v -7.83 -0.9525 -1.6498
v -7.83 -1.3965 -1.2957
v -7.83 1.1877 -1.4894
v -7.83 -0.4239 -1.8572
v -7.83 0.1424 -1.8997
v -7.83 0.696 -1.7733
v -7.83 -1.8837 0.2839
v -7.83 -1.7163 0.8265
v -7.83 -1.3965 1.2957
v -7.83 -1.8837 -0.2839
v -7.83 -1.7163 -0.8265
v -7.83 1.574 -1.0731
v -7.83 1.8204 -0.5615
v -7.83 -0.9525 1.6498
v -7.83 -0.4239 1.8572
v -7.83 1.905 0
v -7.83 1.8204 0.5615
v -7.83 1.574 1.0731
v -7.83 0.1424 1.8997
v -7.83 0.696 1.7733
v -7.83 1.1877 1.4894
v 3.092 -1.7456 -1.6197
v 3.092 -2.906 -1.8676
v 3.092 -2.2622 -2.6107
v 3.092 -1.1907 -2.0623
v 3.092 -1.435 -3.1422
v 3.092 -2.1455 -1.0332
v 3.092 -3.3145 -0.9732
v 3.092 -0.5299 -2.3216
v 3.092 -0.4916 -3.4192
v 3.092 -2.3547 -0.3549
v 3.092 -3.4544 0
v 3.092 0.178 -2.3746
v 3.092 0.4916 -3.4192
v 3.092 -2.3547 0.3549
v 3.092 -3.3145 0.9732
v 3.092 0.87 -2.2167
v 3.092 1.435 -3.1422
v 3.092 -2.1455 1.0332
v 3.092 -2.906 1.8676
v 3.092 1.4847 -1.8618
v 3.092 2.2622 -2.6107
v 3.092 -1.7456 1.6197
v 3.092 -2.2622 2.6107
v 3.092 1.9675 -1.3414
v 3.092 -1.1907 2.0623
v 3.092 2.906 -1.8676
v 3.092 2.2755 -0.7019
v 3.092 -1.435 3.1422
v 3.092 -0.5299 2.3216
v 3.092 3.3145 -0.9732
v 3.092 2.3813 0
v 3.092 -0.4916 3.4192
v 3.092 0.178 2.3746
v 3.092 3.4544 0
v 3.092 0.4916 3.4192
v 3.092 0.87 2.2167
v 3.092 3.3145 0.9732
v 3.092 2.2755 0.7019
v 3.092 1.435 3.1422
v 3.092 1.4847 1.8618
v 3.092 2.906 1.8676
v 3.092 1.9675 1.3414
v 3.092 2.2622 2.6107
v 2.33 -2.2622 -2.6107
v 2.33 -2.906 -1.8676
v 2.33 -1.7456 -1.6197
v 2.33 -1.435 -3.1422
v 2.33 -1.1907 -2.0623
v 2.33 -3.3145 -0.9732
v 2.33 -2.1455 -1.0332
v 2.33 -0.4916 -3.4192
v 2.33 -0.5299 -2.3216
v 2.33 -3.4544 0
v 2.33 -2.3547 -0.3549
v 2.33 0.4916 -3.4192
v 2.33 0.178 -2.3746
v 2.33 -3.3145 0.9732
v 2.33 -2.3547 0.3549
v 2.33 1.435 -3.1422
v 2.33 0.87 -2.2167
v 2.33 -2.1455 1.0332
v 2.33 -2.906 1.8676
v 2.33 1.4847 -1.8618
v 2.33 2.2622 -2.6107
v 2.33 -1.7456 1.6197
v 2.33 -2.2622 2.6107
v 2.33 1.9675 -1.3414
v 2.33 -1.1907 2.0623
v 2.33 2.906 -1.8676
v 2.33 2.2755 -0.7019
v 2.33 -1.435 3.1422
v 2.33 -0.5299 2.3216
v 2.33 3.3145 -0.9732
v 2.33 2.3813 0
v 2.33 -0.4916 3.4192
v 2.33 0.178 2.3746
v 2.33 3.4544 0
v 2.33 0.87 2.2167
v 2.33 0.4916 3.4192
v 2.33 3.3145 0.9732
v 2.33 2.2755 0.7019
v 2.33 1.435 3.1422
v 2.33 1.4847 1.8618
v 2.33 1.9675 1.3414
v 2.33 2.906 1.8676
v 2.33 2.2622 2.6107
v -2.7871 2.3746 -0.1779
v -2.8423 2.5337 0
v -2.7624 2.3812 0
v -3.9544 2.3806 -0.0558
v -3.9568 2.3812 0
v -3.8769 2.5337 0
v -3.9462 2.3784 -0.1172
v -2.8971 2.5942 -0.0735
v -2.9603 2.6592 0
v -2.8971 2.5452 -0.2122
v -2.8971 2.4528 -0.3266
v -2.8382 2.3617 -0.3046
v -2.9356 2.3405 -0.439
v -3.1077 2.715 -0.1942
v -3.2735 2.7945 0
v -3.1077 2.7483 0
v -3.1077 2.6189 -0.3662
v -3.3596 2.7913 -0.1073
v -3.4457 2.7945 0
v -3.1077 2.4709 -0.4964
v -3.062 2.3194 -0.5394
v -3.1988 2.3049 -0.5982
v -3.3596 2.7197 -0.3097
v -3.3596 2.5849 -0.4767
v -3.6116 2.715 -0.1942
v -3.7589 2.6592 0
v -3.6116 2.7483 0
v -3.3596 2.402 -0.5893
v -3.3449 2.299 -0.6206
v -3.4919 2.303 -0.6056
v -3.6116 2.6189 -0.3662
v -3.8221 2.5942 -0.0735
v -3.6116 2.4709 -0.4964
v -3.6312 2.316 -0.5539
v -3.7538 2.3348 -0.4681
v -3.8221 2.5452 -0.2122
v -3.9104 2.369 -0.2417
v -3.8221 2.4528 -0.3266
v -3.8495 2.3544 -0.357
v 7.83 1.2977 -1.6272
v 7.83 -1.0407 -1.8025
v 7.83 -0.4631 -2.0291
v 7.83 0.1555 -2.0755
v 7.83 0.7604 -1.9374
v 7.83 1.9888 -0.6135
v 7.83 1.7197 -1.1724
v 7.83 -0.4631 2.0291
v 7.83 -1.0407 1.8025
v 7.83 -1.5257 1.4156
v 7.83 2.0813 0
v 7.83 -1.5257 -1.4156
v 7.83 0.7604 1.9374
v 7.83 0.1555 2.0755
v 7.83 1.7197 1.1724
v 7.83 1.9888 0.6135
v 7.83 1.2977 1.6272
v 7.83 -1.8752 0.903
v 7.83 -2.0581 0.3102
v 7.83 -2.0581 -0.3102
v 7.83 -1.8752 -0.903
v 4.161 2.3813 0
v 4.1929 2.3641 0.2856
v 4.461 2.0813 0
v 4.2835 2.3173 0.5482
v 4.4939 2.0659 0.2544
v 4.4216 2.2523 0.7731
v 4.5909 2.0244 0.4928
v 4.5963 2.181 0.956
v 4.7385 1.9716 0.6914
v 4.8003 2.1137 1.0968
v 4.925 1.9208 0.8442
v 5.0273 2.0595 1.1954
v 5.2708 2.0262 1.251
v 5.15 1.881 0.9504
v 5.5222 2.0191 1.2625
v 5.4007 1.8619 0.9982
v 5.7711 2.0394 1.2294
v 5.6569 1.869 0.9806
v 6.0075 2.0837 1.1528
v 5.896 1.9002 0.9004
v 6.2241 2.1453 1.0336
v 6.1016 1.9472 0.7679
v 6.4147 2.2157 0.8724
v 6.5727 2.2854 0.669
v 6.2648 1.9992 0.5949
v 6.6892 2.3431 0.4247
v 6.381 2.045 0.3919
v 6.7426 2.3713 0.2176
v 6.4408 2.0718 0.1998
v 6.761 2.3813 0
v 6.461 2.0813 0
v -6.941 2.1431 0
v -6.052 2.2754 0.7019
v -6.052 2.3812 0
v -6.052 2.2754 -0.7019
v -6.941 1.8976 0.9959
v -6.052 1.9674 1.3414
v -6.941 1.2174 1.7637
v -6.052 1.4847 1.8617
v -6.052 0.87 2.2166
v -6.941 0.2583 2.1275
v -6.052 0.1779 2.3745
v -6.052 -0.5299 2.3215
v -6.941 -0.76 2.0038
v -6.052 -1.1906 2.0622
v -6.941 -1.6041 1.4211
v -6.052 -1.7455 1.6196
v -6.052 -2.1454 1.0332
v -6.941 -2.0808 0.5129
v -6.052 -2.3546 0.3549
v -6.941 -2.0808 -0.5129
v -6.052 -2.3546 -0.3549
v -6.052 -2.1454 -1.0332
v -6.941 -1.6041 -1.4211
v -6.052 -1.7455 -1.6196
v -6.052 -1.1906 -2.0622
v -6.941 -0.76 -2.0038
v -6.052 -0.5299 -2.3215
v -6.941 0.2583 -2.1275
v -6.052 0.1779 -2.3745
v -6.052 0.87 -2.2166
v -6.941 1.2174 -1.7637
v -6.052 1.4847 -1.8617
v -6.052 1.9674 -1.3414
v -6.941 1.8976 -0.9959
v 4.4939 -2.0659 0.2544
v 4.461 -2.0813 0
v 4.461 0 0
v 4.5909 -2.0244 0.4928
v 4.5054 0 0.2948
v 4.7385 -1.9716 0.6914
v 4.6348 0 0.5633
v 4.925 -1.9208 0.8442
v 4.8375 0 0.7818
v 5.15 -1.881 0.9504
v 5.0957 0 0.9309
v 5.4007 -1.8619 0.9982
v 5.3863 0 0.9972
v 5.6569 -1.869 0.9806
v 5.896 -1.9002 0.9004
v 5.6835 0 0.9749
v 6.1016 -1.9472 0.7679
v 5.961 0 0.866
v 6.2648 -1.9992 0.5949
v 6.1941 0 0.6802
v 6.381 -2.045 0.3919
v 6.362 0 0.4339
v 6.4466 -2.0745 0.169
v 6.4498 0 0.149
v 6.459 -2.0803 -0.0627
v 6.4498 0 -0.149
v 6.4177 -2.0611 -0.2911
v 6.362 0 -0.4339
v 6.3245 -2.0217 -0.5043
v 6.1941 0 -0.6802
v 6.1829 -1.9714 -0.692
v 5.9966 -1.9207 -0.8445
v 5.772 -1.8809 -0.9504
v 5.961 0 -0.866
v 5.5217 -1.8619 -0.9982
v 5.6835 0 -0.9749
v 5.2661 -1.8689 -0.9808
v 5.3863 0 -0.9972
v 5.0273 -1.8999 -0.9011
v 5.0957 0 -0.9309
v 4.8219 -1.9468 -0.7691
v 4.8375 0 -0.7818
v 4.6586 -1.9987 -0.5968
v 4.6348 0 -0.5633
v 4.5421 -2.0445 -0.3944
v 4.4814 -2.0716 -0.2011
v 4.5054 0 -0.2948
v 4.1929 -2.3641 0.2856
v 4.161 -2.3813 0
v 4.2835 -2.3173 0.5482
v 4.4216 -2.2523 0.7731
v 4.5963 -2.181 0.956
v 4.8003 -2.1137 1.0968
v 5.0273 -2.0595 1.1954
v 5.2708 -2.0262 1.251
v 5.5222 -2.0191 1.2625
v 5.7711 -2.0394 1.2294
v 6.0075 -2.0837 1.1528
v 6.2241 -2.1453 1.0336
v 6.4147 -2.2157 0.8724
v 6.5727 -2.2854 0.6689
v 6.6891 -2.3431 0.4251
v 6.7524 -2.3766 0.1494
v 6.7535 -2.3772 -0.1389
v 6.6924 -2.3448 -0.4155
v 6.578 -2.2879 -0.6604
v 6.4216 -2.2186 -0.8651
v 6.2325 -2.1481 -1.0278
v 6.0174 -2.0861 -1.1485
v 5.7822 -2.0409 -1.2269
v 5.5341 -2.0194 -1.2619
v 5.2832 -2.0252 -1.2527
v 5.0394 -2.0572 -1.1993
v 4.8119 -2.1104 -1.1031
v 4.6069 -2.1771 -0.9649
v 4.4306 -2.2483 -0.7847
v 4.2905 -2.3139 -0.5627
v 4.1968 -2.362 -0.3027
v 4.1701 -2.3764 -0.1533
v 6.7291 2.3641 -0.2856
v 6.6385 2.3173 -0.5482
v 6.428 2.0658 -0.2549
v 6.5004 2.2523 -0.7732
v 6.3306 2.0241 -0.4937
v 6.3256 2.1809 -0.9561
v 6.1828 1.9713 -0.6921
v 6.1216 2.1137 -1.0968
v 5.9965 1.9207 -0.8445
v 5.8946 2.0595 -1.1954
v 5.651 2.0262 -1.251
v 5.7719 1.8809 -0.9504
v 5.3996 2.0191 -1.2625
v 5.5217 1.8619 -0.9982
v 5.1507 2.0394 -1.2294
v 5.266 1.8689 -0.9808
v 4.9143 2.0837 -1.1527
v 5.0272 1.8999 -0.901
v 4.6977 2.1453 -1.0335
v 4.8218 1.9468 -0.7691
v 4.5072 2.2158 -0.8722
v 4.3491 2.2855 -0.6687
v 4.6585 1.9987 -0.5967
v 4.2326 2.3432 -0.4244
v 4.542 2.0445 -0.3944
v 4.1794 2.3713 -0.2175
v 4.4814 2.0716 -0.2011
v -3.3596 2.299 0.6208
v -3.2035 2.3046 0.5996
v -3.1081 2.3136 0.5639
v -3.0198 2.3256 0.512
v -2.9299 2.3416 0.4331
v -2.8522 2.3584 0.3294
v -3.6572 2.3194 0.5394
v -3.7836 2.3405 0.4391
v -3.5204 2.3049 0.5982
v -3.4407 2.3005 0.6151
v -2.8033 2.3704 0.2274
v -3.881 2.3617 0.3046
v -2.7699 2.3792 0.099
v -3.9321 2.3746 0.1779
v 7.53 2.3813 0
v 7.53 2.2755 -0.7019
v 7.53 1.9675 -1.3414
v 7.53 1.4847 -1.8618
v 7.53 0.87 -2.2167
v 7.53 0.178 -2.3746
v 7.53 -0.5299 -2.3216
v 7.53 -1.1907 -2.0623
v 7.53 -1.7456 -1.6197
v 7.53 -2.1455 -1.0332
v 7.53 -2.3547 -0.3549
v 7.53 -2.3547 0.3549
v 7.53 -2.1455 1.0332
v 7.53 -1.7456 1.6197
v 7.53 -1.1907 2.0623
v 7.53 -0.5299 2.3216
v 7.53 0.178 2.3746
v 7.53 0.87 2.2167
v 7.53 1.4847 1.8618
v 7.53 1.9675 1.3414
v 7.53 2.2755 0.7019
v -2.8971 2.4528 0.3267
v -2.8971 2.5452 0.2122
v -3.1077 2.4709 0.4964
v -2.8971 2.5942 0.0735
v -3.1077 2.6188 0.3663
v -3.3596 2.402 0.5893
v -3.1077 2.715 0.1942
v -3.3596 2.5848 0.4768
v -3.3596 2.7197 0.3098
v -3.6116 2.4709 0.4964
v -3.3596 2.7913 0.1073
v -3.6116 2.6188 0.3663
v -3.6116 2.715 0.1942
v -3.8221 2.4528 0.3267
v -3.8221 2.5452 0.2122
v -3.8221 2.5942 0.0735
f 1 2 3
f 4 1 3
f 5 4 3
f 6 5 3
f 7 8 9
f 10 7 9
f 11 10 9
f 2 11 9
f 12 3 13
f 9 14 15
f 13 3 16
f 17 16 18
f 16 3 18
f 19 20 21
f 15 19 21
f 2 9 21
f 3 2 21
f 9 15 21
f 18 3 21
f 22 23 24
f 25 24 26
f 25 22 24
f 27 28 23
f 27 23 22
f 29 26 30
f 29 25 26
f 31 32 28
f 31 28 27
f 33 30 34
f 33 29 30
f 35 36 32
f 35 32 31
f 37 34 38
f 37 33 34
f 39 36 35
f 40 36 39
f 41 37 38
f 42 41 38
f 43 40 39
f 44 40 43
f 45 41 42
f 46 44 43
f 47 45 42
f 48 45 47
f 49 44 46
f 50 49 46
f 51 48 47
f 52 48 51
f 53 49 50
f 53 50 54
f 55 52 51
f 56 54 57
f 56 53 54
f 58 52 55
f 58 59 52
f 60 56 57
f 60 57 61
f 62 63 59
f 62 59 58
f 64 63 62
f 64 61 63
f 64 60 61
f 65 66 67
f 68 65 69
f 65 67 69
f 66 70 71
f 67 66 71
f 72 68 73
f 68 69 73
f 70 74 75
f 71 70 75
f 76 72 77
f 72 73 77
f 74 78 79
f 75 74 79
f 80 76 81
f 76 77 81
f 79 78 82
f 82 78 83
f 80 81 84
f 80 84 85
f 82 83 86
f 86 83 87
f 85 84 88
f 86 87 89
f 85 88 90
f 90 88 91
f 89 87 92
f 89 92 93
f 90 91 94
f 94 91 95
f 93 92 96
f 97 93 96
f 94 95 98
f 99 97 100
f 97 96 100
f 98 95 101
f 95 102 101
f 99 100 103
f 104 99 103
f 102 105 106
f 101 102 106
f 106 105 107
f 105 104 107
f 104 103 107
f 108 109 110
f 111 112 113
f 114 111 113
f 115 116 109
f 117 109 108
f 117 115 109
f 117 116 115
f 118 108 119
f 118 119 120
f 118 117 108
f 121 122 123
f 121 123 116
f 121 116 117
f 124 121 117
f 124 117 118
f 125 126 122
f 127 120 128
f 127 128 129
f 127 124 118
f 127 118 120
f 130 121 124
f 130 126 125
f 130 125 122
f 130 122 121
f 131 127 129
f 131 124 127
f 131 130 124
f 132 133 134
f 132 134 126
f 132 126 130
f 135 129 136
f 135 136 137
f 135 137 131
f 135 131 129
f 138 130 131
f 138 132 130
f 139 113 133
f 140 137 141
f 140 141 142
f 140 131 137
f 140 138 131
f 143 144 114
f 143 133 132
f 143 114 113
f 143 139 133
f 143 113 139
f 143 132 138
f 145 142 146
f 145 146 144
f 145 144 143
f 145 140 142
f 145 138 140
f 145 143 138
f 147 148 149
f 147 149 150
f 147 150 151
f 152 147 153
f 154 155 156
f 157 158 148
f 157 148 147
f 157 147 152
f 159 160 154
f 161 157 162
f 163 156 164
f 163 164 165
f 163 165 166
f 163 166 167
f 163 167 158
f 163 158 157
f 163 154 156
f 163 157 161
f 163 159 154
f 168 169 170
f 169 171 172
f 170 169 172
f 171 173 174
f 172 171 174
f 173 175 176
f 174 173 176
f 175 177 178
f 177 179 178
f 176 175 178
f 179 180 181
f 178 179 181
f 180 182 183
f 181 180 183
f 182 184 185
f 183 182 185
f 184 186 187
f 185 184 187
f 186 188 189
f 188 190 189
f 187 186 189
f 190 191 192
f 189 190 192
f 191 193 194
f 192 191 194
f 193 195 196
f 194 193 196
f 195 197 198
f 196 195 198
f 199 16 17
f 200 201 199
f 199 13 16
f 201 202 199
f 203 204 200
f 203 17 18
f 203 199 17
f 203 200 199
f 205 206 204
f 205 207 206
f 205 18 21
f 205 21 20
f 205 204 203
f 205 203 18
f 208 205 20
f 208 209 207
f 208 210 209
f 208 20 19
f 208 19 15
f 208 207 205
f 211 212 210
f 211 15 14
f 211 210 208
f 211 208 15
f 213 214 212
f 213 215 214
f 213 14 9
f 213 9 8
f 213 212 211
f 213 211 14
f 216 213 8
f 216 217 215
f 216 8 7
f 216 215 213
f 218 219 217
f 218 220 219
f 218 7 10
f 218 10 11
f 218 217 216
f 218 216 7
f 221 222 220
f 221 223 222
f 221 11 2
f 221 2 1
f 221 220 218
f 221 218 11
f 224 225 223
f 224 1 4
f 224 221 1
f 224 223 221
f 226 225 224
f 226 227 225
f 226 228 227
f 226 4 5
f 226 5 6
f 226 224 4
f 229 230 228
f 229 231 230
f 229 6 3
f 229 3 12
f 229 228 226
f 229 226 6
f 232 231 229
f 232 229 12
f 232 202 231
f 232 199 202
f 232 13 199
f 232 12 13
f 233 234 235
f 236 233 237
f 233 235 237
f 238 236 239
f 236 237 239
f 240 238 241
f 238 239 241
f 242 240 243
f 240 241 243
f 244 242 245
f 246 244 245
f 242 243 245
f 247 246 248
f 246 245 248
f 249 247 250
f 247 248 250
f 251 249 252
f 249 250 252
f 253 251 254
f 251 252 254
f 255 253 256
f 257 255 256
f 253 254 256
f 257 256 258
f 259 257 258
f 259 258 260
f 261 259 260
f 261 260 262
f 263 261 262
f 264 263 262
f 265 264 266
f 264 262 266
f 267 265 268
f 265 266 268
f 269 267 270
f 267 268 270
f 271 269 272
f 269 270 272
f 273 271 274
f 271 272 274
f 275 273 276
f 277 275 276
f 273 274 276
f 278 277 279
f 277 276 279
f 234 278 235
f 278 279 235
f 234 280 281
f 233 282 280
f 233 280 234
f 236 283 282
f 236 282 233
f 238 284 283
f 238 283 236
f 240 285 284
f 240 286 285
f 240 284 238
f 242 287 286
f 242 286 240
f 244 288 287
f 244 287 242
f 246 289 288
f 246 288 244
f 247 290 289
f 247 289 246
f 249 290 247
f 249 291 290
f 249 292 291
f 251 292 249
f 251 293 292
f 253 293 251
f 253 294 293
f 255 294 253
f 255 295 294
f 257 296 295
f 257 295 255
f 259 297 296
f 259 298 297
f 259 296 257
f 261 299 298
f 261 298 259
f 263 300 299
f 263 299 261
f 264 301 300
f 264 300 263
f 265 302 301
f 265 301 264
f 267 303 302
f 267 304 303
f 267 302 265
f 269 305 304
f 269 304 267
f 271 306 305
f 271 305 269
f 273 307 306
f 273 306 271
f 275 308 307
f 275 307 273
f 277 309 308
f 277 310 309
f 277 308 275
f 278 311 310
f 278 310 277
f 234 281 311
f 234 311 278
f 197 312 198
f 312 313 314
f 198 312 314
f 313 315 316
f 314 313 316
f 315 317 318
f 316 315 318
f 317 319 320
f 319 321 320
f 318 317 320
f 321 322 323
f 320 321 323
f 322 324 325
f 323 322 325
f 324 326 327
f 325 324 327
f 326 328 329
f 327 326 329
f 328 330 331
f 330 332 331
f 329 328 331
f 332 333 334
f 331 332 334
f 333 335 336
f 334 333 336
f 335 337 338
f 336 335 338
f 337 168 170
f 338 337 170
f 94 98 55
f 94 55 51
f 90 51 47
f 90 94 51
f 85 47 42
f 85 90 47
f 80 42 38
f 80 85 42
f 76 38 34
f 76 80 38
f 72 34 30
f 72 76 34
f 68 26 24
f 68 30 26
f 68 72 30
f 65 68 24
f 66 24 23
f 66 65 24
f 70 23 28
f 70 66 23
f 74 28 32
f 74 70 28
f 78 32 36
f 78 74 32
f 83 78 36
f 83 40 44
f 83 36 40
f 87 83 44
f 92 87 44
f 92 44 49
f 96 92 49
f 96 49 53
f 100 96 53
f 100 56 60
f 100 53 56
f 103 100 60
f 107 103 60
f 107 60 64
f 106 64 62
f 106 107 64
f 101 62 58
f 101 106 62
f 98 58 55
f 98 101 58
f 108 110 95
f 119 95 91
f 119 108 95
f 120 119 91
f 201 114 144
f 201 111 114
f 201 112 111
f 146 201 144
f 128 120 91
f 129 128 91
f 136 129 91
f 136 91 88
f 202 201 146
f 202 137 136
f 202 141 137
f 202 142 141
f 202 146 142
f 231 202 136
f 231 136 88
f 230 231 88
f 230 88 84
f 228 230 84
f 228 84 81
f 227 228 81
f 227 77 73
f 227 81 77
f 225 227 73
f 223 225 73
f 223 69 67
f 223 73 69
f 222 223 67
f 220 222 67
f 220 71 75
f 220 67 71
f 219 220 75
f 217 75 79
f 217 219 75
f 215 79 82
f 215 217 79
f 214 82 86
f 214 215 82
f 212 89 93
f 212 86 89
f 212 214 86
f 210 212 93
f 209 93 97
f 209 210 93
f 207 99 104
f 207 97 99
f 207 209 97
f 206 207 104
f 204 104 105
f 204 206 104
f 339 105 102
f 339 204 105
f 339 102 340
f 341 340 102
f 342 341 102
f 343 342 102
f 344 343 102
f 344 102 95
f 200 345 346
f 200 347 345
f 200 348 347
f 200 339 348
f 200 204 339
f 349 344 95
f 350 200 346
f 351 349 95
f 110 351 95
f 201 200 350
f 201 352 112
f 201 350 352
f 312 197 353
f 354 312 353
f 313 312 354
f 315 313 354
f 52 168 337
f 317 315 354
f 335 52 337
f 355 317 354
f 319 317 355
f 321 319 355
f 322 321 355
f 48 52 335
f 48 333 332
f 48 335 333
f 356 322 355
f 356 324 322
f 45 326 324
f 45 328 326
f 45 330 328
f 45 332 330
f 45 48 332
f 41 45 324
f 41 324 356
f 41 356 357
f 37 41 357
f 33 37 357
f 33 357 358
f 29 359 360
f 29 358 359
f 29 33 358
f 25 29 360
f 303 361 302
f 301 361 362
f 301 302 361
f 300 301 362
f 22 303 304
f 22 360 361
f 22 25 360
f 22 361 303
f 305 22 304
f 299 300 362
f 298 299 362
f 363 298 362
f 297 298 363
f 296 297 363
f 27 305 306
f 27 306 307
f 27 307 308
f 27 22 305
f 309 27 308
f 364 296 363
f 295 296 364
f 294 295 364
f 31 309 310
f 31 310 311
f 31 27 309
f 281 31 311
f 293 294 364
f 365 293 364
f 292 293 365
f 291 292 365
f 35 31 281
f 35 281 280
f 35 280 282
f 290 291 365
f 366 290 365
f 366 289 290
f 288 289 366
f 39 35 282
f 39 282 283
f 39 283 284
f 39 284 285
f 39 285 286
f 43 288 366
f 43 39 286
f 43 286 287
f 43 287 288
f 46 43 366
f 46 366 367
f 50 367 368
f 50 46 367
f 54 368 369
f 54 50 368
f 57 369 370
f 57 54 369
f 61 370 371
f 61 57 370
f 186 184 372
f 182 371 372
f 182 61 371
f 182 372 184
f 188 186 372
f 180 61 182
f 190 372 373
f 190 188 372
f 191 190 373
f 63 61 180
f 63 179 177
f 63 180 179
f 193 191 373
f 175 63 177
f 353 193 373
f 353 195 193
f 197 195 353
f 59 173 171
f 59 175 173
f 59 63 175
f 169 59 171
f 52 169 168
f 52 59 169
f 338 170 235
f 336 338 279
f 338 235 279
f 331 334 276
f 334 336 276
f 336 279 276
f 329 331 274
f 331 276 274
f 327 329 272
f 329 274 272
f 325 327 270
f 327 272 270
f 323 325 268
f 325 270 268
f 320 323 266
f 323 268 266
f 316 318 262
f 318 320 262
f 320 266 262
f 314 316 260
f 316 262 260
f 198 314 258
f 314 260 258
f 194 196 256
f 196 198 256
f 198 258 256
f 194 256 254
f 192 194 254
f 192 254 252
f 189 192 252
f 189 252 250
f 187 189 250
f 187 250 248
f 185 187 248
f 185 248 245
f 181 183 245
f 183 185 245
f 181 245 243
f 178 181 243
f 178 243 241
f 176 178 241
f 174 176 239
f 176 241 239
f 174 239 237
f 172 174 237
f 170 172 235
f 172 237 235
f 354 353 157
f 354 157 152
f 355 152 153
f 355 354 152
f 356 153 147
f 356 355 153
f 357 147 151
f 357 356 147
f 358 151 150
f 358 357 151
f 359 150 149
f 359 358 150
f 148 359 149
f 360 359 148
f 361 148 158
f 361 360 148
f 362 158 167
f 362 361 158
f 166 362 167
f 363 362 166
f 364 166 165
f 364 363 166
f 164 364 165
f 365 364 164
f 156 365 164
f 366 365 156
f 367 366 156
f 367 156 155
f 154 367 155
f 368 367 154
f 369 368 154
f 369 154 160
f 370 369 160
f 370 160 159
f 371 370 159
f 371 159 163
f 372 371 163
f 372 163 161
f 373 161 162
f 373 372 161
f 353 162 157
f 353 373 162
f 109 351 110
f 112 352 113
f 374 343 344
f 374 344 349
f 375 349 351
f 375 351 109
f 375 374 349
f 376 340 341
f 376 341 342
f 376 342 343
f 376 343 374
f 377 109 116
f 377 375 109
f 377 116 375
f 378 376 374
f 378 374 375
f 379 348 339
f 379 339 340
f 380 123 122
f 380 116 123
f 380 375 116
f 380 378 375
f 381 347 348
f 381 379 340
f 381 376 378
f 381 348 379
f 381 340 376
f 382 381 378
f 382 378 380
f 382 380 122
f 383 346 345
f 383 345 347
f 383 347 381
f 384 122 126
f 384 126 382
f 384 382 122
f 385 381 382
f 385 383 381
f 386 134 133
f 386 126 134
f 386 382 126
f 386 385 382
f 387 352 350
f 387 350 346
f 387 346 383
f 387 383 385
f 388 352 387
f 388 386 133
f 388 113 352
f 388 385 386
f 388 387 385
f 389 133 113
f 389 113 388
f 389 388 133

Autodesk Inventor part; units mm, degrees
ref_plane "YZ Plane" through (0, 0, 0) normal (1, 0, 0) x (0, 1, 0)
ref_plane "XZ Plane" through (0, 0, 0) normal (0, 1, 0) x (-1, 0, 0)
ref_plane "XY Plane" through (0, 0, 0) normal (0, 0, 1) x (1, 0, 0)
sketch "Sketch1" plane through (0, 0, 0) normal (0, 0, 1) x (1, 0, 0)
  line L0 (-7.83, 0) -> (7.83, 0)
  line L1 (7.83, 0) -> (7.83, 2.3813)
  line L2 (7.83, 2.3813) -> (3.092, 2.3813)
  line L3 (3.092, 2.3813) -> (3.092, 3.4544)
  line L4 (3.092, 3.4544) -> (2.33, 3.4544)
  line L5 (2.33, 3.4544) -> (2.33, 2.3813)
  line L6 (2.33, 2.3813) -> (-6.052, 2.3812)
  line L7 (-6.052, 2.3812) -> (-7.83, 1.905)
  line L8 (-7.83, 1.905) -> (-7.83, 0)
  point P0 (0, 0)
  point P1 (0, 0)
  dimension "d0" = 4.7625
  dimension "d1" = 10.16
  dimension "d2" = 6.9088
  dimension "d3" = 1.778
  dimension "d4" = 3.81
  dimension "d5" = 0.762
  dimension "d6" = 5.5
  dimension "d7" = 4.738
revolve "Revolution1" add sketch "Sketch1" angle 360 about axis through (-7.83, 0, 0) along (1, 0, 0)
sketch "Sketch2" plane through (0, 0, 0) normal (0, 1, 0) x (-1, 0, 0)
  line L0 (-3.092, 2.3812) -> (-3.092, -2.3812) projected
  line L1 (-3.092, 0) -> (-7.83, 0) construction
  circle A0 centre (-5.461, 0) radius 1
  line L2 (-7.83, 2.3812) -> (-7.83, -2.3812) projected
  point P0 (0, 0)
  point P1 (-7.33, 2.3812)
  point P2 (-7.33, -2.3812)
  dimension "d12" = 2
extrude "Extrusion1" cut sketch "Sketch2" along normal through all both and the other way through all
chamfer "Chamfer2" distance 0.3 angle 45 4 edges at (7.83, -2.3812, 0) (5.4611, 2.1611, 1) (5.4609, 2.1611, -1) (6.461, -2.3812, -0.003)
sketch "Sketch3" plane through (0, 0, 0) normal (0, 0, 1) x (1, 0, 0)
  line L0 (-6.052, 2.3812) -> (2.33, 2.3812) projected
  line L1 (-7.83, -1.905) -> (-7.83, 1.905) projected
  arc A0 (-2.7246, 2.1654) -> (-3.9946, 2.1654) centre (-3.3596, 2.1654) ccw
  line L2 (-3.9946, 2.1654) -> (-2.7246, 2.1654)
  line L3 (-6.052, -2.3812) -> (2.33, -2.3812) projected
  line L4 (2.33, -3.4544) -> (2.33, 3.4544) projected
  point P0 (0, 0)
  point P1 (-3.3596, 2.8004)
  point P2 (-2.7624, 2.3812)
  dimension "d18" = 4.4704
  dimension "d20" = 5.1816
  dimension "d21" = 1.27
  dimension "d22" = 5.0924
revolve "Revolution2" add sketch "Sketch3" angle 360 about axis through (-3.9946, 2.1654, 0) along (1, 0, 0)
properties part number "Pin_RBF" material "Stainless Steel"
